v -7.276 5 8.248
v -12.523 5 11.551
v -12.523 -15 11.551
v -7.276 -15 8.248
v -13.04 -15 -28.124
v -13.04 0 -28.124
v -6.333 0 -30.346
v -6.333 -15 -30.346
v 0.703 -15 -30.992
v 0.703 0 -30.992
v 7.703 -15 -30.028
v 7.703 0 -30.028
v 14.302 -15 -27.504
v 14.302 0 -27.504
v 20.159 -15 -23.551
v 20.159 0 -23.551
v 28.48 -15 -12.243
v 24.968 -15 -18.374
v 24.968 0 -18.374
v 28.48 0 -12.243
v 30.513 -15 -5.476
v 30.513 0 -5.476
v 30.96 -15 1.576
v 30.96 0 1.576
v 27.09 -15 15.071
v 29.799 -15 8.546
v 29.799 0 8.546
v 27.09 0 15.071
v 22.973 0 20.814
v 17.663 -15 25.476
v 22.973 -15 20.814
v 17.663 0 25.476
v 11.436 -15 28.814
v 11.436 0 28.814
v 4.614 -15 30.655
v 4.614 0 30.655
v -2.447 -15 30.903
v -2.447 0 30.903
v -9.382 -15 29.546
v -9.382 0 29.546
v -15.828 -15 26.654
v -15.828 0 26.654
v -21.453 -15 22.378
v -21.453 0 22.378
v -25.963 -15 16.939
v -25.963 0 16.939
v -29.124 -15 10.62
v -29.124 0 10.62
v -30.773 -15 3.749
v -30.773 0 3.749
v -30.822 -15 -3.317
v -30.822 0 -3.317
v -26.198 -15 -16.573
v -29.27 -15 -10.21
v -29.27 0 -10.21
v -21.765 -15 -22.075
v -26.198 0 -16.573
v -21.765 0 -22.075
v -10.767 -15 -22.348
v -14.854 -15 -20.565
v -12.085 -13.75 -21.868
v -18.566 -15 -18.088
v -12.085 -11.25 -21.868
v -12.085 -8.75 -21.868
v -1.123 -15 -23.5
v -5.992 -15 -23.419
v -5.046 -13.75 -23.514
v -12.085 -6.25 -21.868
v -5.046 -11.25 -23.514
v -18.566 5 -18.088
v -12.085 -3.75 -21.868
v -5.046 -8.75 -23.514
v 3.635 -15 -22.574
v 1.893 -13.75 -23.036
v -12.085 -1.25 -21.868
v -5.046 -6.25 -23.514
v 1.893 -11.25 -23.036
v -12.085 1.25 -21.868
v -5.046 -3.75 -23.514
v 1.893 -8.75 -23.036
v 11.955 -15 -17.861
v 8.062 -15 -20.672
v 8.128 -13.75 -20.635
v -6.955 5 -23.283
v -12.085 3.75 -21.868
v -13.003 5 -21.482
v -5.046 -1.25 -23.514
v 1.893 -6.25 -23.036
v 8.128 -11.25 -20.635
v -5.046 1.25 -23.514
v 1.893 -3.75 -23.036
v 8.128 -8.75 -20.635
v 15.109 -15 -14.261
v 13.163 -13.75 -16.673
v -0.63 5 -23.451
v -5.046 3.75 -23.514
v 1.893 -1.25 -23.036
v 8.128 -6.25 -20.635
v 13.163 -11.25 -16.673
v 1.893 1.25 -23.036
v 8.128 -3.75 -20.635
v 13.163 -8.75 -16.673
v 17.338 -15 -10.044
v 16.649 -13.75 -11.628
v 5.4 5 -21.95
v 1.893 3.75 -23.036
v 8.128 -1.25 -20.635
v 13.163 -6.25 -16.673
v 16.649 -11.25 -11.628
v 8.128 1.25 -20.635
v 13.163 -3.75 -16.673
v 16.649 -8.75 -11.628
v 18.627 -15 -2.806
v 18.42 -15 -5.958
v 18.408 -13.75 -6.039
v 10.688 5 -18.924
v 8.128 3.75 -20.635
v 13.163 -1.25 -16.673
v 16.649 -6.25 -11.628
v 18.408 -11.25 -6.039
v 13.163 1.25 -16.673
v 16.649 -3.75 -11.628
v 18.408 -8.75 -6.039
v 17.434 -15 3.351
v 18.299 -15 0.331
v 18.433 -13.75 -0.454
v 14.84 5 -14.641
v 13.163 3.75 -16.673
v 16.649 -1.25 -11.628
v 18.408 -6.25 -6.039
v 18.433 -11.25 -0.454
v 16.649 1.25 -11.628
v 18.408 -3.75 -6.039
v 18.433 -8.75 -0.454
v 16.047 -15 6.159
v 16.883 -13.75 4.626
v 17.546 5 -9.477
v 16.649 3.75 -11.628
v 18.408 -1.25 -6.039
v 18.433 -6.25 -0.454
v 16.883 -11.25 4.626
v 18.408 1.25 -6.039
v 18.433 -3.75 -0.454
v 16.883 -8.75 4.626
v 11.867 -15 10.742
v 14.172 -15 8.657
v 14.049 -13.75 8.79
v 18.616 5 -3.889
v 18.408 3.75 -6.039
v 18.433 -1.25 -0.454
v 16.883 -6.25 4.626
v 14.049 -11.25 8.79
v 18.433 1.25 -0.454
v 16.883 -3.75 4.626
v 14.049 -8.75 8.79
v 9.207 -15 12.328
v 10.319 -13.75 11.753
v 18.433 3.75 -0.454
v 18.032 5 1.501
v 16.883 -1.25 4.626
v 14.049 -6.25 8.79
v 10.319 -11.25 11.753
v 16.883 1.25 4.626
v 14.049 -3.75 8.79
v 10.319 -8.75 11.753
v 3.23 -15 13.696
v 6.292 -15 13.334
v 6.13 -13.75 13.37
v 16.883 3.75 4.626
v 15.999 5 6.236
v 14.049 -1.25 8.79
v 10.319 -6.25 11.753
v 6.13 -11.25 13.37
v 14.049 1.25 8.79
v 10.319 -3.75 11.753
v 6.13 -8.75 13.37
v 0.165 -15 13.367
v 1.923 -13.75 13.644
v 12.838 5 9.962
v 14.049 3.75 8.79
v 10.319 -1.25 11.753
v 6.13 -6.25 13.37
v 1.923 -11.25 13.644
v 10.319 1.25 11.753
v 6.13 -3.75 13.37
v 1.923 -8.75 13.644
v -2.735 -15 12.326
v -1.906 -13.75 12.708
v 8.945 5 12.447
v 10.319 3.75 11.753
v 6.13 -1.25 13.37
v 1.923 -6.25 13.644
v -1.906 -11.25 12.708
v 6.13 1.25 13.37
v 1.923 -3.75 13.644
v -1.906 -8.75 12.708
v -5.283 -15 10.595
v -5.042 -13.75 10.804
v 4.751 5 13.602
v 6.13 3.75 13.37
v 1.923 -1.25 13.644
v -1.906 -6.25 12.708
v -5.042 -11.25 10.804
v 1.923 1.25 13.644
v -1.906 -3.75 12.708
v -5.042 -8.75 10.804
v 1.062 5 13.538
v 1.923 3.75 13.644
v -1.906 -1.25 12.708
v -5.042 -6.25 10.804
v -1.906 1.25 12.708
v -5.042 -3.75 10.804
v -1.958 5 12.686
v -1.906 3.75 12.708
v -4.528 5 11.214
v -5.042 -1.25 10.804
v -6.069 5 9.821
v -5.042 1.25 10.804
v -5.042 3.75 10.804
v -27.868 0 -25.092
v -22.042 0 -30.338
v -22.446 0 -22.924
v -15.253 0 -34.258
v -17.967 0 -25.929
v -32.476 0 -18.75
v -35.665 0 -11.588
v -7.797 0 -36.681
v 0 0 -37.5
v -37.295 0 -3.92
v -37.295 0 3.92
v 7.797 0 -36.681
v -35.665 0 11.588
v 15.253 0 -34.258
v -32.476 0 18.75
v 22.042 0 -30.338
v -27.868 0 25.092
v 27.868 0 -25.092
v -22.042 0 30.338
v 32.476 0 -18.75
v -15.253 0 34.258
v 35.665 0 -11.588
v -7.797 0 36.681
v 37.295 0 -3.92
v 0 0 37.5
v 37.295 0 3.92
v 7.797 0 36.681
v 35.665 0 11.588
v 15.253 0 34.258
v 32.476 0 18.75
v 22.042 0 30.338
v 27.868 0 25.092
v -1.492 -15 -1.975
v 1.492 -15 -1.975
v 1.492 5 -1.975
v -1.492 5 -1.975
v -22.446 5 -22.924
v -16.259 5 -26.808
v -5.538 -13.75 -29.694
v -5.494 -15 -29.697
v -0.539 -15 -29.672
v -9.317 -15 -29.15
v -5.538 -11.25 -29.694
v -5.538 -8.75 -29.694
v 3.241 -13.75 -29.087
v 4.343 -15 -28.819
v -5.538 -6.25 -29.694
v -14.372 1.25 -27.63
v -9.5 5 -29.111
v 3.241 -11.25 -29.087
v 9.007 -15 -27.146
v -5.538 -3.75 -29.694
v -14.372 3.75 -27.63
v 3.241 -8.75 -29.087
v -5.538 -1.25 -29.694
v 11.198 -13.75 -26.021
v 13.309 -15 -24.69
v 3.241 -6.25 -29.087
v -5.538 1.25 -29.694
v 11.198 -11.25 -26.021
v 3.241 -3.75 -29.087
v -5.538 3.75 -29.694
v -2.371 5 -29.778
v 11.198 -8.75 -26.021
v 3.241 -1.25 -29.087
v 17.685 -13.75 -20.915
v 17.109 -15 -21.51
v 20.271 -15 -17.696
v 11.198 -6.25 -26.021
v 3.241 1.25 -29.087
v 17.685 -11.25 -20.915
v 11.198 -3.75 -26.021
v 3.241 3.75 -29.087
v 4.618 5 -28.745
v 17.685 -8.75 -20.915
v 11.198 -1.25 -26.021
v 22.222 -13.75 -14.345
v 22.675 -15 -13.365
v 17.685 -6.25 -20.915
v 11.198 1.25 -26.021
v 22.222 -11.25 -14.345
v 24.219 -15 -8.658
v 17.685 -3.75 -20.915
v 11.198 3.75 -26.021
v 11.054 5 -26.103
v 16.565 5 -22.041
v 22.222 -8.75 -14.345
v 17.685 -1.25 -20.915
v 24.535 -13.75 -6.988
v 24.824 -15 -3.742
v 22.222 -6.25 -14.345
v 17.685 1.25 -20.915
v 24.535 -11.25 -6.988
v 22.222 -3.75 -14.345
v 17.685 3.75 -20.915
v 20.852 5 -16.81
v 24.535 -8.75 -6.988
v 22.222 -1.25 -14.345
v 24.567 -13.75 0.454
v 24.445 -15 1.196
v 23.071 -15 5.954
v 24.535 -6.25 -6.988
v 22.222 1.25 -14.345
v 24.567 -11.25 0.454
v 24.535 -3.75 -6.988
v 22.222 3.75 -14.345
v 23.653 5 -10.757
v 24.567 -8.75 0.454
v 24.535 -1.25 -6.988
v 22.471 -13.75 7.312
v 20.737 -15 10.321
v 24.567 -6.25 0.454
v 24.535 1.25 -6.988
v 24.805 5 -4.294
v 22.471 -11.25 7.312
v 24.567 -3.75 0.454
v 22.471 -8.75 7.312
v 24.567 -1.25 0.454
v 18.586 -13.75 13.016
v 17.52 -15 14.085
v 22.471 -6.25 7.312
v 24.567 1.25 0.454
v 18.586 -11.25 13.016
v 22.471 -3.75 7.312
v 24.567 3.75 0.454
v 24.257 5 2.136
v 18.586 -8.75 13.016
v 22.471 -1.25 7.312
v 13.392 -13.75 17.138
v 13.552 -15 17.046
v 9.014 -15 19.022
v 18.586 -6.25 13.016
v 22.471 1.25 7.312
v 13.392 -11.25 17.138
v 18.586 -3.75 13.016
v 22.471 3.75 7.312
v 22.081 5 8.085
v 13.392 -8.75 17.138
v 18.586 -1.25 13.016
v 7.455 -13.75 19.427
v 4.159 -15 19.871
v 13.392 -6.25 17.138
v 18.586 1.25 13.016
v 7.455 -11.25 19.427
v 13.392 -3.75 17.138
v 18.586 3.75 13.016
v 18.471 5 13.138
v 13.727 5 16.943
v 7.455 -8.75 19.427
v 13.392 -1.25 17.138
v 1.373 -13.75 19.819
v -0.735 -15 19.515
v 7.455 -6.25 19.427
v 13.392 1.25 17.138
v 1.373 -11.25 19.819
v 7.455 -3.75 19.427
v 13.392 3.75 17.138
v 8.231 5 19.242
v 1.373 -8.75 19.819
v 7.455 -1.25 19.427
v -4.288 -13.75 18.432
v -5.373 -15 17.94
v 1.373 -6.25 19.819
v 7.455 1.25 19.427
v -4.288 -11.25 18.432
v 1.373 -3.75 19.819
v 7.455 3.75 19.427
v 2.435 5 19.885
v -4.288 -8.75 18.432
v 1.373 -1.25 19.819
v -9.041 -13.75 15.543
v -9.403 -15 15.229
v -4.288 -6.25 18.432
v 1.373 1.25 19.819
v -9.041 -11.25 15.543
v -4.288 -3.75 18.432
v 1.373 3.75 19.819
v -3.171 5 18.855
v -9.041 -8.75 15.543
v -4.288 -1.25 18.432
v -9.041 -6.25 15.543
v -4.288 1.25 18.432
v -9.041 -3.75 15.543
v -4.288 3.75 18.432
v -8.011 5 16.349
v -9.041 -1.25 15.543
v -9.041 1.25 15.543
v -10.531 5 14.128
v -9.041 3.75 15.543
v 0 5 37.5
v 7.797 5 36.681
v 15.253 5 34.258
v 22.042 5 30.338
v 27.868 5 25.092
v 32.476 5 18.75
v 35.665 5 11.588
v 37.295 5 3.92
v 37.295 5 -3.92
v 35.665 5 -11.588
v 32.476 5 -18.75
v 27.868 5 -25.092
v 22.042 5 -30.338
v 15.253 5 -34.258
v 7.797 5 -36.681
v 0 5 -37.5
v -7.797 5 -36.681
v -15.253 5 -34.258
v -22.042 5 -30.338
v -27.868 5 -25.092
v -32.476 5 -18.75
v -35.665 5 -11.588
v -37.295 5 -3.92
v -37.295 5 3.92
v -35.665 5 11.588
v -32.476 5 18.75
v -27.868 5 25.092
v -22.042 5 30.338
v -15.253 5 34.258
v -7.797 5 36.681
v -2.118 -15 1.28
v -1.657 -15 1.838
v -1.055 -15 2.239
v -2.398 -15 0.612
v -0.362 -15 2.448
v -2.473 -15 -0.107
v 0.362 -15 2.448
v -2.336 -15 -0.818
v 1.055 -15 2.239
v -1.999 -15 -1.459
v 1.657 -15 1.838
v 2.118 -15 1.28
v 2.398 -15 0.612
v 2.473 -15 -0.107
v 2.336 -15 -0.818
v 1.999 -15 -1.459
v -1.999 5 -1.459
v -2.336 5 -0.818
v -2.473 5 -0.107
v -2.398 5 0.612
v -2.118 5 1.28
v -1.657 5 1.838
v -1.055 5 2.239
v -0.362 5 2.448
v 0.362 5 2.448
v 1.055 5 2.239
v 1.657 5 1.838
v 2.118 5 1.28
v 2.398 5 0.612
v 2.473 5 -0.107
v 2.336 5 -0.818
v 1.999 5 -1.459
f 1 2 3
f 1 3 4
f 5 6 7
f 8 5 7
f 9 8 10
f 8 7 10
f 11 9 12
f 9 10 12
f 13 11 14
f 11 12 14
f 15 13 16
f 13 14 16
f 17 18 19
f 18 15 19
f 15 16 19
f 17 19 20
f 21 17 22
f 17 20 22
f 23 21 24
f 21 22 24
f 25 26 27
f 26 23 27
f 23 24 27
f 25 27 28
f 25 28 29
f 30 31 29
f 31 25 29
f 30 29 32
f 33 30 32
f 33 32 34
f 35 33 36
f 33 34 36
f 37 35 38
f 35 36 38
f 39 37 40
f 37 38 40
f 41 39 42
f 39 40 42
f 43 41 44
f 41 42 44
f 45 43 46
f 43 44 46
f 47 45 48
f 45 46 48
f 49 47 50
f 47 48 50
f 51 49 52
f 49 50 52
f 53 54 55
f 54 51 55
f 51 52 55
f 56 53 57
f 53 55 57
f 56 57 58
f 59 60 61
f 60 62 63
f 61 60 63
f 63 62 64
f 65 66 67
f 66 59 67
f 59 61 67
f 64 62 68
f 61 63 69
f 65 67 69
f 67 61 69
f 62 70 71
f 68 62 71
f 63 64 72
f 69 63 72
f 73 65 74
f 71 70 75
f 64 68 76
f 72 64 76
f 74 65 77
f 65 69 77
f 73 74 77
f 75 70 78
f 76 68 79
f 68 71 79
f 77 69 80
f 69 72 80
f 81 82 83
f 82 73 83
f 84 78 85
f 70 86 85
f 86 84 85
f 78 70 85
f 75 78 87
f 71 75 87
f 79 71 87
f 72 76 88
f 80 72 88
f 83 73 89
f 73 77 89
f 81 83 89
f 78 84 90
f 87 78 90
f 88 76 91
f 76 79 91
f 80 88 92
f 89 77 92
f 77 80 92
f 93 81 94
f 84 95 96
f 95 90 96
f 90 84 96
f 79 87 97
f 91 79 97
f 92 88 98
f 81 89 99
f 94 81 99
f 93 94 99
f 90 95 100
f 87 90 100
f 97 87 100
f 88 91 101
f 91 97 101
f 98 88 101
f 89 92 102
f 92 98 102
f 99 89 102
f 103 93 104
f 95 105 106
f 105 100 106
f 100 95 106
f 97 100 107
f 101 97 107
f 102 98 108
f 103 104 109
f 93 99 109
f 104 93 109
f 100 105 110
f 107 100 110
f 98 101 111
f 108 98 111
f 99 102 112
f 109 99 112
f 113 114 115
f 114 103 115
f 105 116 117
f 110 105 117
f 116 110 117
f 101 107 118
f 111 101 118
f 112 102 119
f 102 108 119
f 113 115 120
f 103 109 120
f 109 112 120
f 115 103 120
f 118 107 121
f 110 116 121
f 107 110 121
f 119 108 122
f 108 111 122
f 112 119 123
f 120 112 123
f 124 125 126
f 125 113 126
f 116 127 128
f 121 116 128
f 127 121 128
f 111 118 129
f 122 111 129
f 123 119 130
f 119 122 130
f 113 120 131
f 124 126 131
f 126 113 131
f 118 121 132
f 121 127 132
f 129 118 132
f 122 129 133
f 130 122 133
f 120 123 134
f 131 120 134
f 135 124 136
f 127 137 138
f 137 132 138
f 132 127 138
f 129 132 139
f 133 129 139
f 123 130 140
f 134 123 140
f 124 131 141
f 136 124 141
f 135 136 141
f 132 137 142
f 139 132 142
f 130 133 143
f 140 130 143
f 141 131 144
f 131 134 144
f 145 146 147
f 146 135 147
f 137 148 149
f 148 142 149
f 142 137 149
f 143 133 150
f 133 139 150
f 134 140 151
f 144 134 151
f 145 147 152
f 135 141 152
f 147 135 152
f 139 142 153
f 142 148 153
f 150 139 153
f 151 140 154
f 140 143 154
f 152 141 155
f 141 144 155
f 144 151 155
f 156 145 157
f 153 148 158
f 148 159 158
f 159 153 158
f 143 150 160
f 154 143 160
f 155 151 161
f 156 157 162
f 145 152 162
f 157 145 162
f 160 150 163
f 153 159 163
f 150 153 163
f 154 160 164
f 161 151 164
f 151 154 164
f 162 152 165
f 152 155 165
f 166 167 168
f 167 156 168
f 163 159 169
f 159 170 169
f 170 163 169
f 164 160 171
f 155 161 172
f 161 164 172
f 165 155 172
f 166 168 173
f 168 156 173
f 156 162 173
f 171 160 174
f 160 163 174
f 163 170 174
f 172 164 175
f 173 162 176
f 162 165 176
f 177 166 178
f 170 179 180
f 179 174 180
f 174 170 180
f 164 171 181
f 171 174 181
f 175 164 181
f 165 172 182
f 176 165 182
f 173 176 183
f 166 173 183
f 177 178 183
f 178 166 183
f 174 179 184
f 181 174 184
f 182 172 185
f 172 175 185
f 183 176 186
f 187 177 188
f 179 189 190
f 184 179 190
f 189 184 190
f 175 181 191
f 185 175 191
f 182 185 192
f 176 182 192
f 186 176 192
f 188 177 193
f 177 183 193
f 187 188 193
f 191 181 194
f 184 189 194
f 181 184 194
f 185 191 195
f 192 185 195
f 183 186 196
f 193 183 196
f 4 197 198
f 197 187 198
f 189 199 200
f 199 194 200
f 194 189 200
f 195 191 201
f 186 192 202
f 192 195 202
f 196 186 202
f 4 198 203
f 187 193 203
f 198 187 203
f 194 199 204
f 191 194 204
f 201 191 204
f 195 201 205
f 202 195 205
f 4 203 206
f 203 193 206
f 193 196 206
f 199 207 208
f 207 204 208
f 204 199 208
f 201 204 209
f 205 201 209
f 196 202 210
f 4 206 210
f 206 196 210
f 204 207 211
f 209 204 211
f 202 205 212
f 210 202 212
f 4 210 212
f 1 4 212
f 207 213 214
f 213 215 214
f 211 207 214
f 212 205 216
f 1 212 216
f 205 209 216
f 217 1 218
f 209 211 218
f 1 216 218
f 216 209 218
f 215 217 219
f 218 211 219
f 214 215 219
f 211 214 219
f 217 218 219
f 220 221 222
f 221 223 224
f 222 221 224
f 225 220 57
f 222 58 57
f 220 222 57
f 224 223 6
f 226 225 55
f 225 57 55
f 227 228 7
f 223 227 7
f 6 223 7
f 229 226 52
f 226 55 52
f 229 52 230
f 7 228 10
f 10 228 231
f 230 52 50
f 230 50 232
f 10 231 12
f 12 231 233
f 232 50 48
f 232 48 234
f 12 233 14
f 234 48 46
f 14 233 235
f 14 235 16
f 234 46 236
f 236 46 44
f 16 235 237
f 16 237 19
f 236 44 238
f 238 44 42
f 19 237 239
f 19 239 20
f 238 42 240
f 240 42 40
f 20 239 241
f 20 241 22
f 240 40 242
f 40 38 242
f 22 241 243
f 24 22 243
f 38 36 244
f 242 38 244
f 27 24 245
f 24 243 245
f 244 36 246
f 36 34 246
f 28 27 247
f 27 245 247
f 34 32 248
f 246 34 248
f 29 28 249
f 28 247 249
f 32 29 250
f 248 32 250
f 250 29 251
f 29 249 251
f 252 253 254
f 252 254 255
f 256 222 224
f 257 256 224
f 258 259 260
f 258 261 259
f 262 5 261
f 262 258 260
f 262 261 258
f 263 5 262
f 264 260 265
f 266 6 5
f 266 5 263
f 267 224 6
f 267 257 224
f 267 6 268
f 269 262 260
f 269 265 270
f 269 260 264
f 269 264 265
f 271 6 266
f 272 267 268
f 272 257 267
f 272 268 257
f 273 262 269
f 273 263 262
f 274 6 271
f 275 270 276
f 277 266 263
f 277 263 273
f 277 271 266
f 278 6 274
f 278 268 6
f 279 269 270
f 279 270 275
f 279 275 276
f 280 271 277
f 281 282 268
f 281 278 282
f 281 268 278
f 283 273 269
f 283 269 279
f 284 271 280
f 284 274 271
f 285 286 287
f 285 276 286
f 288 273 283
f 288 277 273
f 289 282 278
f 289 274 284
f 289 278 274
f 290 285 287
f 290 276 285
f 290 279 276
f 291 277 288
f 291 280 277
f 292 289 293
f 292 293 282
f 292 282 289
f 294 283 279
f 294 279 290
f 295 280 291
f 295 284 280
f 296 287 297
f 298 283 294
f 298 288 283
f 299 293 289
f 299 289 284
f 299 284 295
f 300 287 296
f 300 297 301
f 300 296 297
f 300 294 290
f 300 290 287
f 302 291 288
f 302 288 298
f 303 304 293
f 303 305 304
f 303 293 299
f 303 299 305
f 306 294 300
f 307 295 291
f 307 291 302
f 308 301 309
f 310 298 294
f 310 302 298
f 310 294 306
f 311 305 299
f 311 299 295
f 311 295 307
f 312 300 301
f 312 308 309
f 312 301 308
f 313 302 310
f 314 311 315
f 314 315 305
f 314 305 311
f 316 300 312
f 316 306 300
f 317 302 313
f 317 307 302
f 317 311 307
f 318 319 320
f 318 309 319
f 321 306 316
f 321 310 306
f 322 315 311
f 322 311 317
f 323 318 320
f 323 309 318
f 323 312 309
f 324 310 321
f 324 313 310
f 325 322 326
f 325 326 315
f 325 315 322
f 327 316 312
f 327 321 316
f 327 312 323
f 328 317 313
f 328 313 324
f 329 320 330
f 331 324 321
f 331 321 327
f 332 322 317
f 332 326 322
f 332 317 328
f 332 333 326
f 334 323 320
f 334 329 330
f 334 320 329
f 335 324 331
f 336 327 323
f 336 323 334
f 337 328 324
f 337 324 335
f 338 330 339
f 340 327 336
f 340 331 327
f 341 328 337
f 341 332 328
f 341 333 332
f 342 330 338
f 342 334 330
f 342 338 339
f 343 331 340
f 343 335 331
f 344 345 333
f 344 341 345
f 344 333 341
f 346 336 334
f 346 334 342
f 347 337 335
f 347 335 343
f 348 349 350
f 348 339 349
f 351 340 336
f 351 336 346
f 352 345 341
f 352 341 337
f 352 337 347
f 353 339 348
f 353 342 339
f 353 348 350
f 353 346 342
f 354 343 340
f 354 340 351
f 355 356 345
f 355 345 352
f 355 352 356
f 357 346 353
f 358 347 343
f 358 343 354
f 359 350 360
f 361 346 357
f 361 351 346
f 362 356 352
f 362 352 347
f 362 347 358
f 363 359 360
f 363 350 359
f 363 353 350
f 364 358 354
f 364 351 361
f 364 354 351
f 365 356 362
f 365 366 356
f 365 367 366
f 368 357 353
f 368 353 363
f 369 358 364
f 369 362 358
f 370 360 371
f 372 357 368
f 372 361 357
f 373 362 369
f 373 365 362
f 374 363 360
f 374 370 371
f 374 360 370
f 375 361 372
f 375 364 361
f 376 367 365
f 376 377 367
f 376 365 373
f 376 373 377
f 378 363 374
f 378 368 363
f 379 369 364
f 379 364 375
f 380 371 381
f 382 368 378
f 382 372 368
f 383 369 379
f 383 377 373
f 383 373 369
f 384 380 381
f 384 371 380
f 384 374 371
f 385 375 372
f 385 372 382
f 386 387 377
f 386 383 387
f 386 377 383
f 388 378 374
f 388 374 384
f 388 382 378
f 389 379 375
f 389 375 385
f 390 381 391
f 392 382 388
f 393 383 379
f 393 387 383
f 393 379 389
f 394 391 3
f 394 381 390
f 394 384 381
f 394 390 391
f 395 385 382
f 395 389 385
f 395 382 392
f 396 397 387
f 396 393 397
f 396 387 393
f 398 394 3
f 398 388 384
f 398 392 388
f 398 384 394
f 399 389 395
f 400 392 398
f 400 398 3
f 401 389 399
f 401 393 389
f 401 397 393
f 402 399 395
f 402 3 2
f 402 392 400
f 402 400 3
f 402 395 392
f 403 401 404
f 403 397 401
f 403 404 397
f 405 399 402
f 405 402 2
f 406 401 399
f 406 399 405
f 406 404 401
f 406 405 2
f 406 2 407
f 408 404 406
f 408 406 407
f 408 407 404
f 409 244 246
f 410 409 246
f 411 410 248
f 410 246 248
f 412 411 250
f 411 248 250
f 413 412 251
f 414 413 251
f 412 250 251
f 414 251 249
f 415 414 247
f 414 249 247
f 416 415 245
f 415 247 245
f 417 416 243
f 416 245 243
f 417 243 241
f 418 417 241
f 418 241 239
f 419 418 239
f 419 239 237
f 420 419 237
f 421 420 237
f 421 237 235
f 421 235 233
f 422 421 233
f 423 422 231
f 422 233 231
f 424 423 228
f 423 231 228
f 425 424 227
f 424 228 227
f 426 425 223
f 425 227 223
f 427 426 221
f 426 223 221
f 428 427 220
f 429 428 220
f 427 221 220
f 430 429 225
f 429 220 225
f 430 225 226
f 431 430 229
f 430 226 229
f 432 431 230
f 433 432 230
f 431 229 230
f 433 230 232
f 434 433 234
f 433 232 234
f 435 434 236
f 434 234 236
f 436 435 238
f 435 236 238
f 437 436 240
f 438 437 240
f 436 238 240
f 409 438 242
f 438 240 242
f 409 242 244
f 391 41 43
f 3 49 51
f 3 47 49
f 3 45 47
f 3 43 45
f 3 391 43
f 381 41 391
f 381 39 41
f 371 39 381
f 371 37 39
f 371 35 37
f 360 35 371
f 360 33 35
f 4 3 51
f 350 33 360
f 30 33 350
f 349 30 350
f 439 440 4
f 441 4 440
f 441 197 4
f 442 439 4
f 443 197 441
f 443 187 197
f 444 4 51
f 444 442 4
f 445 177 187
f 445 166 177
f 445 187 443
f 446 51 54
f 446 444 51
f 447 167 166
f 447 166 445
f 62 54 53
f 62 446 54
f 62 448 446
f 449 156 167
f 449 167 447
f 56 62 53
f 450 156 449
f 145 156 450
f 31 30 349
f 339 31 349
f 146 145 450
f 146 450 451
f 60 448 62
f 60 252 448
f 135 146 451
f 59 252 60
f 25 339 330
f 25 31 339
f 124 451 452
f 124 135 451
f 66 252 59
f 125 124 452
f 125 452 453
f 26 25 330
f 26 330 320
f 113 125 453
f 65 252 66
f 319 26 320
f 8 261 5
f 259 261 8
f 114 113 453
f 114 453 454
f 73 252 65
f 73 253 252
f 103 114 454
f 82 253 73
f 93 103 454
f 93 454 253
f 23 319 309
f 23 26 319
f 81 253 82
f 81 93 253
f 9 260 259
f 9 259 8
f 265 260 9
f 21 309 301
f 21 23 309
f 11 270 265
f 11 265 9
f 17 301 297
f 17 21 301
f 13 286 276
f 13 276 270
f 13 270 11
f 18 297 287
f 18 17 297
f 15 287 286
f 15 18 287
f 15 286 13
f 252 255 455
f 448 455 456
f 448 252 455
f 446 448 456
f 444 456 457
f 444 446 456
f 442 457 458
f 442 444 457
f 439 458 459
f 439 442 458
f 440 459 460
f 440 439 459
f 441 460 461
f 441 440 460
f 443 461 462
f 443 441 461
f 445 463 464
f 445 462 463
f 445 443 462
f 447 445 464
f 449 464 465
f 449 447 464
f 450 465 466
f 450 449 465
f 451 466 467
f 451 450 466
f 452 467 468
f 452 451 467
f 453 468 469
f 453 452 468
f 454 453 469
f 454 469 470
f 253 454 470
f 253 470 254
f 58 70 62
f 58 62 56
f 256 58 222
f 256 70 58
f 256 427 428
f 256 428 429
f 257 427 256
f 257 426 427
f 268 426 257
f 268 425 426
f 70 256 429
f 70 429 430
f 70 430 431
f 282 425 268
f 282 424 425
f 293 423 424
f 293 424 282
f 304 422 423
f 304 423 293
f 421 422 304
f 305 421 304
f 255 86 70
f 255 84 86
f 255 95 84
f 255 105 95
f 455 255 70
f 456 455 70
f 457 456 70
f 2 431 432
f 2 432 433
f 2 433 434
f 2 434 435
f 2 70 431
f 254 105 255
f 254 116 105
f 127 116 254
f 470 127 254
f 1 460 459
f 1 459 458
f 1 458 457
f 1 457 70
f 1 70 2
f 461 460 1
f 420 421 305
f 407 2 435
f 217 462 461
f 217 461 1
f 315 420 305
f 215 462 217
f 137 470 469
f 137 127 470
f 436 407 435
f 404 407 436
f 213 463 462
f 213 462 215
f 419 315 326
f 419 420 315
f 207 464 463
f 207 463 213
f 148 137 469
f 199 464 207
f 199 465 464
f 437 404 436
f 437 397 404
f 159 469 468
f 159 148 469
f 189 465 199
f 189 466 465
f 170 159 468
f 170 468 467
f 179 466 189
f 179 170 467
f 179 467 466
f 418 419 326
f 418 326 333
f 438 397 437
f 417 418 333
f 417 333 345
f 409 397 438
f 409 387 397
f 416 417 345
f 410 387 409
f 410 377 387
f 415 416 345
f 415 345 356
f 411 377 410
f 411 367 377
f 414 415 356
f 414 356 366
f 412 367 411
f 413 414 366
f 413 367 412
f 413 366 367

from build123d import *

# Parameters (mm, degrees)
SKETCH1_R           = 37.5
BOSS_EXTRUDE1_DEPTH = 5
SKETCH10_R          = 31
BOSS_EXTRUDE2_DEPTH = 15
CUT_EXTRUDE1_DEPTH  = 57.678920244
CUT_EXTRUDE2_DEPTH  = 57.678920244


with BuildPart() as part:
    # Sketch1 → Boss-Extrude1 (new body)
    with BuildSketch(Plane(origin=(0, 0, 0), x_dir=(1, 0, 0), z_dir=(0, 1, 0))):
        Circle(SKETCH1_R)
    extrude(amount=BOSS_EXTRUDE1_DEPTH)

    # Sketch10 → Boss-Extrude2 (add)
    with BuildSketch(Plane.XZ):
        Circle(SKETCH10_R)
    extrude(amount=BOSS_EXTRUDE2_DEPTH)

    # Sketch11 → Cut-Extrude1 (cut, through all)
    with BuildSketch(Plane.XZ.offset(15)):
        with BuildLine():
            Line((1.491643389, -1.975), (-1.491643389, -1.975))
            ThreePointArc((-1.491643389, -1.975), (0, 2.475), (1.491643389, -1.975))
        make_face()
    extrude(amount=-CUT_EXTRUDE1_DEPTH, mode=Mode.SUBTRACT)

    # Sketch12 → Cut-Extrude2 (cut, through all)
    with BuildSketch(Plane(origin=(0, 5, 0), x_dir=(1, 0, 0), z_dir=(0, 1, 0))):
        with BuildLine():
            Line((-12.522960402, -11.550987883), (-7.276029472, -8.24800199))
            add(Edge.make_bspline(
                [(-18.566317366, 18.087986584), (-16.574063082, 19.6861494), (-14.373261885, 20.959086767), (-9.79610982, 22.776270096), (-7.408671534, 23.325251613), (-2.682384051, 23.701949314), (-0.331512749, 23.530934674), (4.117390892, 22.54012868), (6.227320203, 21.718005169), (10.027759886, 19.551591543), (11.728984463, 18.201550208), (14.596266579, 15.14457286), (15.770893072, 13.428953103), (17.527571222, 9.826499131), (18.115264822, 7.92879983), (18.700426824, 4.149147995), (18.700079831, 2.255101797), (18.166772453, -1.34708247), (17.632310064, -3.067469712), (16.13399267, -6.184277521), (15.165044903, -7.59200202), (12.933009073, -9.988675008), (11.661654701, -10.986949869), (8.976160145, -12.519251352), (7.551287211, -13.059754313), (4.709672005, -13.681053825), (3.280670849, -13.764842942), (0.565855338, -13.522749206), (-0.732647761, -13.196039768), (-3.080034254, -12.219492133), (-4.140875366, -11.565006492), (-5.944027576, -10.043678404), (-6.69667503, -9.168330698), (-7.276029472, -8.24800199)],
                knots=[0, 0, 0, 0, 0.0625, 0.0625, 0.125, 0.125, 0.1875, 0.1875, 0.25, 0.25, 0.3125, 0.3125, 0.375, 0.375, 0.4375, 0.4375, 0.5, 0.5, 0.5625, 0.5625, 0.625, 0.625, 0.6875, 0.6875, 0.75, 0.75, 0.8125, 0.8125, 0.875, 0.875, 0.9375, 0.9375, 1, 1, 1, 1], degree=3))
            Line((-18.566317366, 18.087986584), (-22.445875943, 22.924206724))
            add(Edge.make_bspline(
                [(-22.445875943, 22.924206724), (-19.969825826, 24.910464833), (-17.237941121, 26.492521157), (-11.506970883, 28.767783903), (-8.520553945, 29.456293243), (-2.555690408, 29.931708754), (0.409277257, 29.717850527), (6.07214005, 28.456686238), (8.756936396, 27.412613765), (13.639010184, 24.629622306), (15.824727512, 22.897648426), (19.54476833, 18.931495095), (21.070095492, 16.707358252), (23.373848964, 11.983006302), (24.146644363, 9.49504246), (24.923059123, 4.480059499), (24.924920169, 1.966413332), (24.208227547, -2.874432658), (23.491955176, -5.18832883), (21.450084705, -9.435838641), (20.130617856, -11.357409493), (17.041692734, -14.674176771), (15.281683474, -16.059679472), (11.501399671, -18.216650696), (9.493060749, -18.981663836), (5.416503734, -19.872974834), (3.361647035, -19.996666952), (-0.616520536, -19.641913768), (-2.526245675, -19.164989771), (-6.049307758, -17.699343634), (-7.65007538, -16.716185155), (-10.430976704, -14.369925494), (-11.600495296, -13.016362199), (-12.522960402, -11.550987883)],
                knots=[0, 0, 0, 0, 0.0625, 0.0625, 0.125, 0.125, 0.1875, 0.1875, 0.25, 0.25, 0.3125, 0.3125, 0.375, 0.375, 0.4375, 0.4375, 0.5, 0.5, 0.5625, 0.5625, 0.625, 0.625, 0.6875, 0.6875, 0.75, 0.75, 0.8125, 0.8125, 0.875, 0.875, 0.9375, 0.9375, 1, 1, 1, 1], degree=3))
        make_face()
    extrude(amount=-CUT_EXTRUDE2_DEPTH, mode=Mode.SUBTRACT)


solid = part.part
